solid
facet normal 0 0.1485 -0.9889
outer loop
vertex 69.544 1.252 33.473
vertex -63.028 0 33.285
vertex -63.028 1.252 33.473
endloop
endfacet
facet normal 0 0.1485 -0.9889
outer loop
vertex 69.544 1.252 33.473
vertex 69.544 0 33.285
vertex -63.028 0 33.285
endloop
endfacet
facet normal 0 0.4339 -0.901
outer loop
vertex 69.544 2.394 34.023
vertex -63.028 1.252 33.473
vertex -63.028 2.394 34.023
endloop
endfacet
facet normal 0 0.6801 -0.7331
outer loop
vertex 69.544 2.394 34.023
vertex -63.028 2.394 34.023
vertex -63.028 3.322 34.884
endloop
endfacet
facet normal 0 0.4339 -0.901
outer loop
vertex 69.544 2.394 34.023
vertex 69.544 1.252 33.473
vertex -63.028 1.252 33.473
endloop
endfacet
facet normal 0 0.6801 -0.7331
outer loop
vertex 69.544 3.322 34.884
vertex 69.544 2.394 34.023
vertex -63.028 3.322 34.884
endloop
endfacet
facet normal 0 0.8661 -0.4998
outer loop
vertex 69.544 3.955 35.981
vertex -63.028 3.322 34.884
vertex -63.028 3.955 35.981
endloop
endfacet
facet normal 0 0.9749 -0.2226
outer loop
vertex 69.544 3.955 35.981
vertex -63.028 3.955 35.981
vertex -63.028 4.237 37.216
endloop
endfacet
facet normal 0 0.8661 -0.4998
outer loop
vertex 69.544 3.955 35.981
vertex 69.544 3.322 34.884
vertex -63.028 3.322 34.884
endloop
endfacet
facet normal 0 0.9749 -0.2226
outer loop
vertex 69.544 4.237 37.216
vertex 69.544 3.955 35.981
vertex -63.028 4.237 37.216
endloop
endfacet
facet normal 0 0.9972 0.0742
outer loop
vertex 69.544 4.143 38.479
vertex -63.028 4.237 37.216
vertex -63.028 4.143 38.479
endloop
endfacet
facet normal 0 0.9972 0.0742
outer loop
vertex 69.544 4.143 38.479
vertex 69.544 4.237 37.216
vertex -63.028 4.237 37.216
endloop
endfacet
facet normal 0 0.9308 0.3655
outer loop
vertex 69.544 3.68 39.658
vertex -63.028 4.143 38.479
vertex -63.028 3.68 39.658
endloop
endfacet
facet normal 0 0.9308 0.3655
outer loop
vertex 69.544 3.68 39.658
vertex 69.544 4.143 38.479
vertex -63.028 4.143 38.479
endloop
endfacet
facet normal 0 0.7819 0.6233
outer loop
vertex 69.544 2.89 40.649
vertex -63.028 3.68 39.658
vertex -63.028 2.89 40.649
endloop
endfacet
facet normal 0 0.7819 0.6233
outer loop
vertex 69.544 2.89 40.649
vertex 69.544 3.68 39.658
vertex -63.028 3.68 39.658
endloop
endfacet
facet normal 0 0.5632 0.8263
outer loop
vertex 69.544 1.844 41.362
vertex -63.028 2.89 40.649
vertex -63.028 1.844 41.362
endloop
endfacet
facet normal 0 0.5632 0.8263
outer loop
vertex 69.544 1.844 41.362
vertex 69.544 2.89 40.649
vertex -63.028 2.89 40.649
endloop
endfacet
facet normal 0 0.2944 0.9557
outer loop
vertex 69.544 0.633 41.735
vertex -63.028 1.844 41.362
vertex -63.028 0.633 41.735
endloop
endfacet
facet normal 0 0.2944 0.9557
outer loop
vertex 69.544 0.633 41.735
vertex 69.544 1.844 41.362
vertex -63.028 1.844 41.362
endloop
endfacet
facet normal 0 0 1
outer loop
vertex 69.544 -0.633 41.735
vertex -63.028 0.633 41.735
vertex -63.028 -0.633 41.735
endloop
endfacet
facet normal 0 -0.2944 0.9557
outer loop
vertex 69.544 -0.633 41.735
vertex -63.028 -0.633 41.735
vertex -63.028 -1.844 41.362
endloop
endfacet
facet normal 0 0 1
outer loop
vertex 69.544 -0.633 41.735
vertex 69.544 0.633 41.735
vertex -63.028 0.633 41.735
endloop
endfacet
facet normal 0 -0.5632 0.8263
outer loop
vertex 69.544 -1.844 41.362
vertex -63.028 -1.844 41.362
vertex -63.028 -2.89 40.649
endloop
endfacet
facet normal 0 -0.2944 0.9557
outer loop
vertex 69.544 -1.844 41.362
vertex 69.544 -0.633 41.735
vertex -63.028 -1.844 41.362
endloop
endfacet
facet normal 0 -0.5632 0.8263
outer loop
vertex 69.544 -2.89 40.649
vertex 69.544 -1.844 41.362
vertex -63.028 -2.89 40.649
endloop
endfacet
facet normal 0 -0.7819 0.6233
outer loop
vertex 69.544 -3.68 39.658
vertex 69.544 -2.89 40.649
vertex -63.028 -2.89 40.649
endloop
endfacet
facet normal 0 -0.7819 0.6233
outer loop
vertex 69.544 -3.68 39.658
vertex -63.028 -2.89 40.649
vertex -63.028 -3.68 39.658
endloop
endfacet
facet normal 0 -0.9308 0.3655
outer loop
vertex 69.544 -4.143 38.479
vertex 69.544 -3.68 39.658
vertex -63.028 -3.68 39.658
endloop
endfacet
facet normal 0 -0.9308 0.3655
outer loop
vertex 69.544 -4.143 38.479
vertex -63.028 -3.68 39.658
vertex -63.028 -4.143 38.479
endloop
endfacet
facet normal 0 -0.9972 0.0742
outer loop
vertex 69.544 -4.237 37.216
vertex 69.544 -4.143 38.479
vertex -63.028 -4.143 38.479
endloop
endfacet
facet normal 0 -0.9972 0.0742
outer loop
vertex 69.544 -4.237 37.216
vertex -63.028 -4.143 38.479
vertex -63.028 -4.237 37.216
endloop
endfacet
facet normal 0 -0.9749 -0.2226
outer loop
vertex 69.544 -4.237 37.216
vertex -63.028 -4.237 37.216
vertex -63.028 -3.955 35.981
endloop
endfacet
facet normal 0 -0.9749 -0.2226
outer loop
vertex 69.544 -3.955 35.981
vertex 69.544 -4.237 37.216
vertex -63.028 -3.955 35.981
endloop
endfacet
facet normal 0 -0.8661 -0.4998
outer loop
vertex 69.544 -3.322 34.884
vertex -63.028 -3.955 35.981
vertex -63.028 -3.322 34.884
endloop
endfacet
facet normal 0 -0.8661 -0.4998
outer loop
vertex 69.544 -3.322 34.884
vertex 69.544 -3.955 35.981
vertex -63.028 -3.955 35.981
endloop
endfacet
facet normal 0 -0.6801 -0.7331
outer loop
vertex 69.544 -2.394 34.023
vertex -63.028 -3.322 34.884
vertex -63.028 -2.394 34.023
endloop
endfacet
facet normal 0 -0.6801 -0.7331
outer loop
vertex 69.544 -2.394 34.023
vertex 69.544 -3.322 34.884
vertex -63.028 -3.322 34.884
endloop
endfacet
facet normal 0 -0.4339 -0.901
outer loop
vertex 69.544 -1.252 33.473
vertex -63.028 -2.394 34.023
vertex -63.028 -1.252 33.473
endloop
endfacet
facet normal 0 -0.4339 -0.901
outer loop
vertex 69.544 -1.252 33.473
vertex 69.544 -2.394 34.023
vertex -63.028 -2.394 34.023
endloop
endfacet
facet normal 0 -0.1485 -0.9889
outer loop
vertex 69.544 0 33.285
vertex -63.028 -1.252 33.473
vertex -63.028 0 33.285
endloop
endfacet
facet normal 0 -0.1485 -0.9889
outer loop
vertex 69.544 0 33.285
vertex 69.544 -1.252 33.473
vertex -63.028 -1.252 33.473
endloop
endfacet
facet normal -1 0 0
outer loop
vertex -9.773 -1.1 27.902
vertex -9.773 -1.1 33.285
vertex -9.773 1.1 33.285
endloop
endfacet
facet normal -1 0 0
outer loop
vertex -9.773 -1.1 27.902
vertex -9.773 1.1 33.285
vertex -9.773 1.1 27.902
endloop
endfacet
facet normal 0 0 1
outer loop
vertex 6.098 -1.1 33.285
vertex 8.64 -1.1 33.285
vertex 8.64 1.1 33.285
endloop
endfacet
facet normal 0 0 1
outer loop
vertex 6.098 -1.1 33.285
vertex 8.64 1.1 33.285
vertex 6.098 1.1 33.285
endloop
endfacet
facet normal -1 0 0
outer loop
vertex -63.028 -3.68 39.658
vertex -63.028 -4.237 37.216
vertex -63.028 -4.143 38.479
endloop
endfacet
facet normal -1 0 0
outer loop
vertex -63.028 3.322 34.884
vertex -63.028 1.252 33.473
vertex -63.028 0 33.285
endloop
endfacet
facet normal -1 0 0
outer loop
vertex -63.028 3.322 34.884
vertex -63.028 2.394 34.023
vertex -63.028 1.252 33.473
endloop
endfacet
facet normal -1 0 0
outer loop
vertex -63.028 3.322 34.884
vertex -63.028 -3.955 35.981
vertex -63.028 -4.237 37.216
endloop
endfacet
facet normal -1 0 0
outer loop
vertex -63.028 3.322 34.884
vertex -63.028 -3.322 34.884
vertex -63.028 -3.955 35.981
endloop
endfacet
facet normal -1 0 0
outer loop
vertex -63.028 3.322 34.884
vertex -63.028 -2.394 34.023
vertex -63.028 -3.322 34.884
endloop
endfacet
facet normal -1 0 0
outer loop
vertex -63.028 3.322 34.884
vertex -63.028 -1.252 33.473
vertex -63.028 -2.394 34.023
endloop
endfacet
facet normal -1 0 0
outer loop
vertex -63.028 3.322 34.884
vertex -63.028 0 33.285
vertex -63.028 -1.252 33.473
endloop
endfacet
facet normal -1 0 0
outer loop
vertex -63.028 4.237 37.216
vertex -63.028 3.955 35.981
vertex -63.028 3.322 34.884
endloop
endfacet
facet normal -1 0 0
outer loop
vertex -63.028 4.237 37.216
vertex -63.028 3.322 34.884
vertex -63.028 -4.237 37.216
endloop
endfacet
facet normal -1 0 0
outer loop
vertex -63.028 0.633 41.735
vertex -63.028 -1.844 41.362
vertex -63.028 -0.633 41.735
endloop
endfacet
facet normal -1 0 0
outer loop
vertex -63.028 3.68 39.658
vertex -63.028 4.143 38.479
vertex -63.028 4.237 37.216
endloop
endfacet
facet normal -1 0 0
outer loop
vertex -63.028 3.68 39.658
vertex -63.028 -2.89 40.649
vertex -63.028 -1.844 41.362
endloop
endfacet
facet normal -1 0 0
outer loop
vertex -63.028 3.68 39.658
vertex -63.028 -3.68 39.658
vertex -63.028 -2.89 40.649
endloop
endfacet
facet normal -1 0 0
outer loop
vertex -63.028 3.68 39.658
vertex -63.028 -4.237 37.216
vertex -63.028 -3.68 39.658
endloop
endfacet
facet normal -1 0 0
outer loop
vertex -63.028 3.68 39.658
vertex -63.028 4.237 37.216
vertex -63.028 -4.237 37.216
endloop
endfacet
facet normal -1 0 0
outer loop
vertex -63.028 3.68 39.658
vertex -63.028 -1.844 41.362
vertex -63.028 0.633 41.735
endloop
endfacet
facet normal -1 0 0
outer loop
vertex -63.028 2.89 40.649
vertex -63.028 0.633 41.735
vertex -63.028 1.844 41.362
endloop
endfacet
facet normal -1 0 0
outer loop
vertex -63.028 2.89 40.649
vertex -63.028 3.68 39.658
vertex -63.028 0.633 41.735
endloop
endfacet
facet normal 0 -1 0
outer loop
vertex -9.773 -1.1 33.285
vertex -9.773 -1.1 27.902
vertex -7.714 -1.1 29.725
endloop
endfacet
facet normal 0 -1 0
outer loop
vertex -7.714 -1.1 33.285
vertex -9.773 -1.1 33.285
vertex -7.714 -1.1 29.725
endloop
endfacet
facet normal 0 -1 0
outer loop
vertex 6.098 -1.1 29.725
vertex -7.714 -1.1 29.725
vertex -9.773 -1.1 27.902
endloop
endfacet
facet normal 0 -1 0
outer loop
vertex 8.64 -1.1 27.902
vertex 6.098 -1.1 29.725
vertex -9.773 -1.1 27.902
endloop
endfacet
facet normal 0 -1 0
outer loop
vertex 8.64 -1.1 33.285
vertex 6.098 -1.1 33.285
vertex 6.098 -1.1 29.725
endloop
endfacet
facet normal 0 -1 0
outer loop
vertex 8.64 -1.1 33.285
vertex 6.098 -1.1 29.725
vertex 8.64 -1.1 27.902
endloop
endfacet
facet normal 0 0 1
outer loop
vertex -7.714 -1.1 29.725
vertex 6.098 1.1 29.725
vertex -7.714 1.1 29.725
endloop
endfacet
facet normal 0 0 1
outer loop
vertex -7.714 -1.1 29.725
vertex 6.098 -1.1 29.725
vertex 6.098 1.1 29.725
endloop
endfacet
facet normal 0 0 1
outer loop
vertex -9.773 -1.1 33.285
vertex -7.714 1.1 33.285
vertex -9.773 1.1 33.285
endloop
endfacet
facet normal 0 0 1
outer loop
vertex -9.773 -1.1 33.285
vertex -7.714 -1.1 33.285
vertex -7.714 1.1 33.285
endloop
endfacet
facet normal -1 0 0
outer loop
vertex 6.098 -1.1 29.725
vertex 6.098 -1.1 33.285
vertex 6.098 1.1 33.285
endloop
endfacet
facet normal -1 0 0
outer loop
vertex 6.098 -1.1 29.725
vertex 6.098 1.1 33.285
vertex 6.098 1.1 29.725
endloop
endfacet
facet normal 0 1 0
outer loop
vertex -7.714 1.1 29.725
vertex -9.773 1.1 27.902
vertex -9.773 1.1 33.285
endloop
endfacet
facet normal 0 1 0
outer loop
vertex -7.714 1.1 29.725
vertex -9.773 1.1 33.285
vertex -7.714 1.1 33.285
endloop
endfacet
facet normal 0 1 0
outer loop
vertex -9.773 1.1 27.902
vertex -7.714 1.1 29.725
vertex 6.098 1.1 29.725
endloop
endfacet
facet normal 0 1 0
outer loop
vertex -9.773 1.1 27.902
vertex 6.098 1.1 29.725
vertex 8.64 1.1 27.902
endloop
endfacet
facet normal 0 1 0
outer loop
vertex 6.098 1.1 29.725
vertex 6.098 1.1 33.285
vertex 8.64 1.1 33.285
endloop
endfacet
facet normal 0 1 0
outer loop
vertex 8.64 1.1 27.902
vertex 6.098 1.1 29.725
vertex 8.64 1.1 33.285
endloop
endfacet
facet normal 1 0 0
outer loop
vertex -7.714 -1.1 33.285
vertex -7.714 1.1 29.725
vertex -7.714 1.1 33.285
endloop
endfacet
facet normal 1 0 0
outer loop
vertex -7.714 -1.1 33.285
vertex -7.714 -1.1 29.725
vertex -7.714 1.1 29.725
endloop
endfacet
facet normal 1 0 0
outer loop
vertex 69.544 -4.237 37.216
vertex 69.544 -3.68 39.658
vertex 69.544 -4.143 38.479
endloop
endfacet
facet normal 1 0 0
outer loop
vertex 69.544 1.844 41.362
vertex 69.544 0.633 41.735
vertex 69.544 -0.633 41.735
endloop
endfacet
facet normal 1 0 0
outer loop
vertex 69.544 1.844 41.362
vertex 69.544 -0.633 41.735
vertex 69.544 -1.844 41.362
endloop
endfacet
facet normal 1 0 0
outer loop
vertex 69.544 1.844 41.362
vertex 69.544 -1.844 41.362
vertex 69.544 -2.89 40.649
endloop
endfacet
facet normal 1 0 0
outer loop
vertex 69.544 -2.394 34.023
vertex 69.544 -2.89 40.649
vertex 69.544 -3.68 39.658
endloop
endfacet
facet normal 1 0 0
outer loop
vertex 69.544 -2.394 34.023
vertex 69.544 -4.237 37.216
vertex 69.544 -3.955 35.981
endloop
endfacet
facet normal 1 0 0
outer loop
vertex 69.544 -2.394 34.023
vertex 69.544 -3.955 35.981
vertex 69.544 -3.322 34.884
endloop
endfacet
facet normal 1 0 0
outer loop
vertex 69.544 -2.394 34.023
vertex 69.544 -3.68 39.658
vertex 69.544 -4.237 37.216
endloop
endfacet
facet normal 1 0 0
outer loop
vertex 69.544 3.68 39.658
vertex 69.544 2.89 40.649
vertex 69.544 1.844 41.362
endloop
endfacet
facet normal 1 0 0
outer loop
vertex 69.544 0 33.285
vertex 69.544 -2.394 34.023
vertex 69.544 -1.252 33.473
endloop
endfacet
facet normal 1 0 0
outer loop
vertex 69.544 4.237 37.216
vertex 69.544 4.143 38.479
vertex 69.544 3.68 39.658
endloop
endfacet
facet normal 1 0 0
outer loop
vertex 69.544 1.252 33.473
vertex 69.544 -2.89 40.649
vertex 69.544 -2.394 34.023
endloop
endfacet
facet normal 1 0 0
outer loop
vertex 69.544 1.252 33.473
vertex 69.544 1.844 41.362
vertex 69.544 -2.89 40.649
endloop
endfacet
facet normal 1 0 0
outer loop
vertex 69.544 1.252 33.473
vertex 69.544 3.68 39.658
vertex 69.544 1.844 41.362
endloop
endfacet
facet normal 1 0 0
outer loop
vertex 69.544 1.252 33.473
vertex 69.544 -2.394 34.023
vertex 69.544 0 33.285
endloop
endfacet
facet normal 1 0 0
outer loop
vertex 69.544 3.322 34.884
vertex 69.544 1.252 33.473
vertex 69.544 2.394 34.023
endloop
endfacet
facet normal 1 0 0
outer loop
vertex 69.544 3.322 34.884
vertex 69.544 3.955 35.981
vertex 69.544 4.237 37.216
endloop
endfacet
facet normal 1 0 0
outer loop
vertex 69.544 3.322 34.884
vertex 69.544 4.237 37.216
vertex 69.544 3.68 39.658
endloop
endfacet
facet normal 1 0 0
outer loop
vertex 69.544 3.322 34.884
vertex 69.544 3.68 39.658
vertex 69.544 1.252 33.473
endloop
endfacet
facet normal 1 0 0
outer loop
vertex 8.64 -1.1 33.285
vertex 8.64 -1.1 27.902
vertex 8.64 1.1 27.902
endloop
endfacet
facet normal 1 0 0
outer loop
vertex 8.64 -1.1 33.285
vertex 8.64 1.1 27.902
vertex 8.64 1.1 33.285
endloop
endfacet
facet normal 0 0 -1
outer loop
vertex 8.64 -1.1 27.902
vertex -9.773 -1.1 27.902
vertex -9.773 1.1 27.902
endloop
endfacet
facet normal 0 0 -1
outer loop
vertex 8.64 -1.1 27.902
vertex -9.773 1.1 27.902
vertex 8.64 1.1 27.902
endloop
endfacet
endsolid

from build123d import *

# Parameters (mm, degrees)
F2_DEPTH = 1.1


# Not quite as in the source:
# - a feature of the source that left no trace in its solid (it failed there, or was rolled back) is left out


with BuildPart() as f1:
    # F0 (on Front) → F1 (revolve)
    with BuildSketch(Plane.XZ):
        Polygon((69.5436149836, 37.5337265432), (-63.0283281207, 37.5337265432), (-63.0283281207, 33.2846231759), (-9.7729321569, 33.2846231759), (-7.7138668858, 33.2846231759), (6.0978326946, 33.2846231759), (8.6398385465, 33.2846231759), (69.5436149836, 33.2846231759), align=None)
    revolve(axis=Axis((3.2576434314, 0, 37.5337265432), (1, 0, 0)))


with BuildPart() as f2:
    # F0 (on Front) → F2 (new body, symmetric)
    with BuildSketch(Plane.XZ):
        Polygon((-7.7138668858, 33.2846231759), (-9.7729321569, 33.2846231759), (-9.7729321569, 27.9024280608), (8.6398385465, 27.9024280608), (8.6398385465, 33.2846231759), (6.0978326946, 33.2846231759), (6.0978326946, 29.724644497), (-7.7138668858, 29.724644497), align=None)
    extrude(amount=F2_DEPTH, both=True)


solid = Compound([f1.part, f2.part])
